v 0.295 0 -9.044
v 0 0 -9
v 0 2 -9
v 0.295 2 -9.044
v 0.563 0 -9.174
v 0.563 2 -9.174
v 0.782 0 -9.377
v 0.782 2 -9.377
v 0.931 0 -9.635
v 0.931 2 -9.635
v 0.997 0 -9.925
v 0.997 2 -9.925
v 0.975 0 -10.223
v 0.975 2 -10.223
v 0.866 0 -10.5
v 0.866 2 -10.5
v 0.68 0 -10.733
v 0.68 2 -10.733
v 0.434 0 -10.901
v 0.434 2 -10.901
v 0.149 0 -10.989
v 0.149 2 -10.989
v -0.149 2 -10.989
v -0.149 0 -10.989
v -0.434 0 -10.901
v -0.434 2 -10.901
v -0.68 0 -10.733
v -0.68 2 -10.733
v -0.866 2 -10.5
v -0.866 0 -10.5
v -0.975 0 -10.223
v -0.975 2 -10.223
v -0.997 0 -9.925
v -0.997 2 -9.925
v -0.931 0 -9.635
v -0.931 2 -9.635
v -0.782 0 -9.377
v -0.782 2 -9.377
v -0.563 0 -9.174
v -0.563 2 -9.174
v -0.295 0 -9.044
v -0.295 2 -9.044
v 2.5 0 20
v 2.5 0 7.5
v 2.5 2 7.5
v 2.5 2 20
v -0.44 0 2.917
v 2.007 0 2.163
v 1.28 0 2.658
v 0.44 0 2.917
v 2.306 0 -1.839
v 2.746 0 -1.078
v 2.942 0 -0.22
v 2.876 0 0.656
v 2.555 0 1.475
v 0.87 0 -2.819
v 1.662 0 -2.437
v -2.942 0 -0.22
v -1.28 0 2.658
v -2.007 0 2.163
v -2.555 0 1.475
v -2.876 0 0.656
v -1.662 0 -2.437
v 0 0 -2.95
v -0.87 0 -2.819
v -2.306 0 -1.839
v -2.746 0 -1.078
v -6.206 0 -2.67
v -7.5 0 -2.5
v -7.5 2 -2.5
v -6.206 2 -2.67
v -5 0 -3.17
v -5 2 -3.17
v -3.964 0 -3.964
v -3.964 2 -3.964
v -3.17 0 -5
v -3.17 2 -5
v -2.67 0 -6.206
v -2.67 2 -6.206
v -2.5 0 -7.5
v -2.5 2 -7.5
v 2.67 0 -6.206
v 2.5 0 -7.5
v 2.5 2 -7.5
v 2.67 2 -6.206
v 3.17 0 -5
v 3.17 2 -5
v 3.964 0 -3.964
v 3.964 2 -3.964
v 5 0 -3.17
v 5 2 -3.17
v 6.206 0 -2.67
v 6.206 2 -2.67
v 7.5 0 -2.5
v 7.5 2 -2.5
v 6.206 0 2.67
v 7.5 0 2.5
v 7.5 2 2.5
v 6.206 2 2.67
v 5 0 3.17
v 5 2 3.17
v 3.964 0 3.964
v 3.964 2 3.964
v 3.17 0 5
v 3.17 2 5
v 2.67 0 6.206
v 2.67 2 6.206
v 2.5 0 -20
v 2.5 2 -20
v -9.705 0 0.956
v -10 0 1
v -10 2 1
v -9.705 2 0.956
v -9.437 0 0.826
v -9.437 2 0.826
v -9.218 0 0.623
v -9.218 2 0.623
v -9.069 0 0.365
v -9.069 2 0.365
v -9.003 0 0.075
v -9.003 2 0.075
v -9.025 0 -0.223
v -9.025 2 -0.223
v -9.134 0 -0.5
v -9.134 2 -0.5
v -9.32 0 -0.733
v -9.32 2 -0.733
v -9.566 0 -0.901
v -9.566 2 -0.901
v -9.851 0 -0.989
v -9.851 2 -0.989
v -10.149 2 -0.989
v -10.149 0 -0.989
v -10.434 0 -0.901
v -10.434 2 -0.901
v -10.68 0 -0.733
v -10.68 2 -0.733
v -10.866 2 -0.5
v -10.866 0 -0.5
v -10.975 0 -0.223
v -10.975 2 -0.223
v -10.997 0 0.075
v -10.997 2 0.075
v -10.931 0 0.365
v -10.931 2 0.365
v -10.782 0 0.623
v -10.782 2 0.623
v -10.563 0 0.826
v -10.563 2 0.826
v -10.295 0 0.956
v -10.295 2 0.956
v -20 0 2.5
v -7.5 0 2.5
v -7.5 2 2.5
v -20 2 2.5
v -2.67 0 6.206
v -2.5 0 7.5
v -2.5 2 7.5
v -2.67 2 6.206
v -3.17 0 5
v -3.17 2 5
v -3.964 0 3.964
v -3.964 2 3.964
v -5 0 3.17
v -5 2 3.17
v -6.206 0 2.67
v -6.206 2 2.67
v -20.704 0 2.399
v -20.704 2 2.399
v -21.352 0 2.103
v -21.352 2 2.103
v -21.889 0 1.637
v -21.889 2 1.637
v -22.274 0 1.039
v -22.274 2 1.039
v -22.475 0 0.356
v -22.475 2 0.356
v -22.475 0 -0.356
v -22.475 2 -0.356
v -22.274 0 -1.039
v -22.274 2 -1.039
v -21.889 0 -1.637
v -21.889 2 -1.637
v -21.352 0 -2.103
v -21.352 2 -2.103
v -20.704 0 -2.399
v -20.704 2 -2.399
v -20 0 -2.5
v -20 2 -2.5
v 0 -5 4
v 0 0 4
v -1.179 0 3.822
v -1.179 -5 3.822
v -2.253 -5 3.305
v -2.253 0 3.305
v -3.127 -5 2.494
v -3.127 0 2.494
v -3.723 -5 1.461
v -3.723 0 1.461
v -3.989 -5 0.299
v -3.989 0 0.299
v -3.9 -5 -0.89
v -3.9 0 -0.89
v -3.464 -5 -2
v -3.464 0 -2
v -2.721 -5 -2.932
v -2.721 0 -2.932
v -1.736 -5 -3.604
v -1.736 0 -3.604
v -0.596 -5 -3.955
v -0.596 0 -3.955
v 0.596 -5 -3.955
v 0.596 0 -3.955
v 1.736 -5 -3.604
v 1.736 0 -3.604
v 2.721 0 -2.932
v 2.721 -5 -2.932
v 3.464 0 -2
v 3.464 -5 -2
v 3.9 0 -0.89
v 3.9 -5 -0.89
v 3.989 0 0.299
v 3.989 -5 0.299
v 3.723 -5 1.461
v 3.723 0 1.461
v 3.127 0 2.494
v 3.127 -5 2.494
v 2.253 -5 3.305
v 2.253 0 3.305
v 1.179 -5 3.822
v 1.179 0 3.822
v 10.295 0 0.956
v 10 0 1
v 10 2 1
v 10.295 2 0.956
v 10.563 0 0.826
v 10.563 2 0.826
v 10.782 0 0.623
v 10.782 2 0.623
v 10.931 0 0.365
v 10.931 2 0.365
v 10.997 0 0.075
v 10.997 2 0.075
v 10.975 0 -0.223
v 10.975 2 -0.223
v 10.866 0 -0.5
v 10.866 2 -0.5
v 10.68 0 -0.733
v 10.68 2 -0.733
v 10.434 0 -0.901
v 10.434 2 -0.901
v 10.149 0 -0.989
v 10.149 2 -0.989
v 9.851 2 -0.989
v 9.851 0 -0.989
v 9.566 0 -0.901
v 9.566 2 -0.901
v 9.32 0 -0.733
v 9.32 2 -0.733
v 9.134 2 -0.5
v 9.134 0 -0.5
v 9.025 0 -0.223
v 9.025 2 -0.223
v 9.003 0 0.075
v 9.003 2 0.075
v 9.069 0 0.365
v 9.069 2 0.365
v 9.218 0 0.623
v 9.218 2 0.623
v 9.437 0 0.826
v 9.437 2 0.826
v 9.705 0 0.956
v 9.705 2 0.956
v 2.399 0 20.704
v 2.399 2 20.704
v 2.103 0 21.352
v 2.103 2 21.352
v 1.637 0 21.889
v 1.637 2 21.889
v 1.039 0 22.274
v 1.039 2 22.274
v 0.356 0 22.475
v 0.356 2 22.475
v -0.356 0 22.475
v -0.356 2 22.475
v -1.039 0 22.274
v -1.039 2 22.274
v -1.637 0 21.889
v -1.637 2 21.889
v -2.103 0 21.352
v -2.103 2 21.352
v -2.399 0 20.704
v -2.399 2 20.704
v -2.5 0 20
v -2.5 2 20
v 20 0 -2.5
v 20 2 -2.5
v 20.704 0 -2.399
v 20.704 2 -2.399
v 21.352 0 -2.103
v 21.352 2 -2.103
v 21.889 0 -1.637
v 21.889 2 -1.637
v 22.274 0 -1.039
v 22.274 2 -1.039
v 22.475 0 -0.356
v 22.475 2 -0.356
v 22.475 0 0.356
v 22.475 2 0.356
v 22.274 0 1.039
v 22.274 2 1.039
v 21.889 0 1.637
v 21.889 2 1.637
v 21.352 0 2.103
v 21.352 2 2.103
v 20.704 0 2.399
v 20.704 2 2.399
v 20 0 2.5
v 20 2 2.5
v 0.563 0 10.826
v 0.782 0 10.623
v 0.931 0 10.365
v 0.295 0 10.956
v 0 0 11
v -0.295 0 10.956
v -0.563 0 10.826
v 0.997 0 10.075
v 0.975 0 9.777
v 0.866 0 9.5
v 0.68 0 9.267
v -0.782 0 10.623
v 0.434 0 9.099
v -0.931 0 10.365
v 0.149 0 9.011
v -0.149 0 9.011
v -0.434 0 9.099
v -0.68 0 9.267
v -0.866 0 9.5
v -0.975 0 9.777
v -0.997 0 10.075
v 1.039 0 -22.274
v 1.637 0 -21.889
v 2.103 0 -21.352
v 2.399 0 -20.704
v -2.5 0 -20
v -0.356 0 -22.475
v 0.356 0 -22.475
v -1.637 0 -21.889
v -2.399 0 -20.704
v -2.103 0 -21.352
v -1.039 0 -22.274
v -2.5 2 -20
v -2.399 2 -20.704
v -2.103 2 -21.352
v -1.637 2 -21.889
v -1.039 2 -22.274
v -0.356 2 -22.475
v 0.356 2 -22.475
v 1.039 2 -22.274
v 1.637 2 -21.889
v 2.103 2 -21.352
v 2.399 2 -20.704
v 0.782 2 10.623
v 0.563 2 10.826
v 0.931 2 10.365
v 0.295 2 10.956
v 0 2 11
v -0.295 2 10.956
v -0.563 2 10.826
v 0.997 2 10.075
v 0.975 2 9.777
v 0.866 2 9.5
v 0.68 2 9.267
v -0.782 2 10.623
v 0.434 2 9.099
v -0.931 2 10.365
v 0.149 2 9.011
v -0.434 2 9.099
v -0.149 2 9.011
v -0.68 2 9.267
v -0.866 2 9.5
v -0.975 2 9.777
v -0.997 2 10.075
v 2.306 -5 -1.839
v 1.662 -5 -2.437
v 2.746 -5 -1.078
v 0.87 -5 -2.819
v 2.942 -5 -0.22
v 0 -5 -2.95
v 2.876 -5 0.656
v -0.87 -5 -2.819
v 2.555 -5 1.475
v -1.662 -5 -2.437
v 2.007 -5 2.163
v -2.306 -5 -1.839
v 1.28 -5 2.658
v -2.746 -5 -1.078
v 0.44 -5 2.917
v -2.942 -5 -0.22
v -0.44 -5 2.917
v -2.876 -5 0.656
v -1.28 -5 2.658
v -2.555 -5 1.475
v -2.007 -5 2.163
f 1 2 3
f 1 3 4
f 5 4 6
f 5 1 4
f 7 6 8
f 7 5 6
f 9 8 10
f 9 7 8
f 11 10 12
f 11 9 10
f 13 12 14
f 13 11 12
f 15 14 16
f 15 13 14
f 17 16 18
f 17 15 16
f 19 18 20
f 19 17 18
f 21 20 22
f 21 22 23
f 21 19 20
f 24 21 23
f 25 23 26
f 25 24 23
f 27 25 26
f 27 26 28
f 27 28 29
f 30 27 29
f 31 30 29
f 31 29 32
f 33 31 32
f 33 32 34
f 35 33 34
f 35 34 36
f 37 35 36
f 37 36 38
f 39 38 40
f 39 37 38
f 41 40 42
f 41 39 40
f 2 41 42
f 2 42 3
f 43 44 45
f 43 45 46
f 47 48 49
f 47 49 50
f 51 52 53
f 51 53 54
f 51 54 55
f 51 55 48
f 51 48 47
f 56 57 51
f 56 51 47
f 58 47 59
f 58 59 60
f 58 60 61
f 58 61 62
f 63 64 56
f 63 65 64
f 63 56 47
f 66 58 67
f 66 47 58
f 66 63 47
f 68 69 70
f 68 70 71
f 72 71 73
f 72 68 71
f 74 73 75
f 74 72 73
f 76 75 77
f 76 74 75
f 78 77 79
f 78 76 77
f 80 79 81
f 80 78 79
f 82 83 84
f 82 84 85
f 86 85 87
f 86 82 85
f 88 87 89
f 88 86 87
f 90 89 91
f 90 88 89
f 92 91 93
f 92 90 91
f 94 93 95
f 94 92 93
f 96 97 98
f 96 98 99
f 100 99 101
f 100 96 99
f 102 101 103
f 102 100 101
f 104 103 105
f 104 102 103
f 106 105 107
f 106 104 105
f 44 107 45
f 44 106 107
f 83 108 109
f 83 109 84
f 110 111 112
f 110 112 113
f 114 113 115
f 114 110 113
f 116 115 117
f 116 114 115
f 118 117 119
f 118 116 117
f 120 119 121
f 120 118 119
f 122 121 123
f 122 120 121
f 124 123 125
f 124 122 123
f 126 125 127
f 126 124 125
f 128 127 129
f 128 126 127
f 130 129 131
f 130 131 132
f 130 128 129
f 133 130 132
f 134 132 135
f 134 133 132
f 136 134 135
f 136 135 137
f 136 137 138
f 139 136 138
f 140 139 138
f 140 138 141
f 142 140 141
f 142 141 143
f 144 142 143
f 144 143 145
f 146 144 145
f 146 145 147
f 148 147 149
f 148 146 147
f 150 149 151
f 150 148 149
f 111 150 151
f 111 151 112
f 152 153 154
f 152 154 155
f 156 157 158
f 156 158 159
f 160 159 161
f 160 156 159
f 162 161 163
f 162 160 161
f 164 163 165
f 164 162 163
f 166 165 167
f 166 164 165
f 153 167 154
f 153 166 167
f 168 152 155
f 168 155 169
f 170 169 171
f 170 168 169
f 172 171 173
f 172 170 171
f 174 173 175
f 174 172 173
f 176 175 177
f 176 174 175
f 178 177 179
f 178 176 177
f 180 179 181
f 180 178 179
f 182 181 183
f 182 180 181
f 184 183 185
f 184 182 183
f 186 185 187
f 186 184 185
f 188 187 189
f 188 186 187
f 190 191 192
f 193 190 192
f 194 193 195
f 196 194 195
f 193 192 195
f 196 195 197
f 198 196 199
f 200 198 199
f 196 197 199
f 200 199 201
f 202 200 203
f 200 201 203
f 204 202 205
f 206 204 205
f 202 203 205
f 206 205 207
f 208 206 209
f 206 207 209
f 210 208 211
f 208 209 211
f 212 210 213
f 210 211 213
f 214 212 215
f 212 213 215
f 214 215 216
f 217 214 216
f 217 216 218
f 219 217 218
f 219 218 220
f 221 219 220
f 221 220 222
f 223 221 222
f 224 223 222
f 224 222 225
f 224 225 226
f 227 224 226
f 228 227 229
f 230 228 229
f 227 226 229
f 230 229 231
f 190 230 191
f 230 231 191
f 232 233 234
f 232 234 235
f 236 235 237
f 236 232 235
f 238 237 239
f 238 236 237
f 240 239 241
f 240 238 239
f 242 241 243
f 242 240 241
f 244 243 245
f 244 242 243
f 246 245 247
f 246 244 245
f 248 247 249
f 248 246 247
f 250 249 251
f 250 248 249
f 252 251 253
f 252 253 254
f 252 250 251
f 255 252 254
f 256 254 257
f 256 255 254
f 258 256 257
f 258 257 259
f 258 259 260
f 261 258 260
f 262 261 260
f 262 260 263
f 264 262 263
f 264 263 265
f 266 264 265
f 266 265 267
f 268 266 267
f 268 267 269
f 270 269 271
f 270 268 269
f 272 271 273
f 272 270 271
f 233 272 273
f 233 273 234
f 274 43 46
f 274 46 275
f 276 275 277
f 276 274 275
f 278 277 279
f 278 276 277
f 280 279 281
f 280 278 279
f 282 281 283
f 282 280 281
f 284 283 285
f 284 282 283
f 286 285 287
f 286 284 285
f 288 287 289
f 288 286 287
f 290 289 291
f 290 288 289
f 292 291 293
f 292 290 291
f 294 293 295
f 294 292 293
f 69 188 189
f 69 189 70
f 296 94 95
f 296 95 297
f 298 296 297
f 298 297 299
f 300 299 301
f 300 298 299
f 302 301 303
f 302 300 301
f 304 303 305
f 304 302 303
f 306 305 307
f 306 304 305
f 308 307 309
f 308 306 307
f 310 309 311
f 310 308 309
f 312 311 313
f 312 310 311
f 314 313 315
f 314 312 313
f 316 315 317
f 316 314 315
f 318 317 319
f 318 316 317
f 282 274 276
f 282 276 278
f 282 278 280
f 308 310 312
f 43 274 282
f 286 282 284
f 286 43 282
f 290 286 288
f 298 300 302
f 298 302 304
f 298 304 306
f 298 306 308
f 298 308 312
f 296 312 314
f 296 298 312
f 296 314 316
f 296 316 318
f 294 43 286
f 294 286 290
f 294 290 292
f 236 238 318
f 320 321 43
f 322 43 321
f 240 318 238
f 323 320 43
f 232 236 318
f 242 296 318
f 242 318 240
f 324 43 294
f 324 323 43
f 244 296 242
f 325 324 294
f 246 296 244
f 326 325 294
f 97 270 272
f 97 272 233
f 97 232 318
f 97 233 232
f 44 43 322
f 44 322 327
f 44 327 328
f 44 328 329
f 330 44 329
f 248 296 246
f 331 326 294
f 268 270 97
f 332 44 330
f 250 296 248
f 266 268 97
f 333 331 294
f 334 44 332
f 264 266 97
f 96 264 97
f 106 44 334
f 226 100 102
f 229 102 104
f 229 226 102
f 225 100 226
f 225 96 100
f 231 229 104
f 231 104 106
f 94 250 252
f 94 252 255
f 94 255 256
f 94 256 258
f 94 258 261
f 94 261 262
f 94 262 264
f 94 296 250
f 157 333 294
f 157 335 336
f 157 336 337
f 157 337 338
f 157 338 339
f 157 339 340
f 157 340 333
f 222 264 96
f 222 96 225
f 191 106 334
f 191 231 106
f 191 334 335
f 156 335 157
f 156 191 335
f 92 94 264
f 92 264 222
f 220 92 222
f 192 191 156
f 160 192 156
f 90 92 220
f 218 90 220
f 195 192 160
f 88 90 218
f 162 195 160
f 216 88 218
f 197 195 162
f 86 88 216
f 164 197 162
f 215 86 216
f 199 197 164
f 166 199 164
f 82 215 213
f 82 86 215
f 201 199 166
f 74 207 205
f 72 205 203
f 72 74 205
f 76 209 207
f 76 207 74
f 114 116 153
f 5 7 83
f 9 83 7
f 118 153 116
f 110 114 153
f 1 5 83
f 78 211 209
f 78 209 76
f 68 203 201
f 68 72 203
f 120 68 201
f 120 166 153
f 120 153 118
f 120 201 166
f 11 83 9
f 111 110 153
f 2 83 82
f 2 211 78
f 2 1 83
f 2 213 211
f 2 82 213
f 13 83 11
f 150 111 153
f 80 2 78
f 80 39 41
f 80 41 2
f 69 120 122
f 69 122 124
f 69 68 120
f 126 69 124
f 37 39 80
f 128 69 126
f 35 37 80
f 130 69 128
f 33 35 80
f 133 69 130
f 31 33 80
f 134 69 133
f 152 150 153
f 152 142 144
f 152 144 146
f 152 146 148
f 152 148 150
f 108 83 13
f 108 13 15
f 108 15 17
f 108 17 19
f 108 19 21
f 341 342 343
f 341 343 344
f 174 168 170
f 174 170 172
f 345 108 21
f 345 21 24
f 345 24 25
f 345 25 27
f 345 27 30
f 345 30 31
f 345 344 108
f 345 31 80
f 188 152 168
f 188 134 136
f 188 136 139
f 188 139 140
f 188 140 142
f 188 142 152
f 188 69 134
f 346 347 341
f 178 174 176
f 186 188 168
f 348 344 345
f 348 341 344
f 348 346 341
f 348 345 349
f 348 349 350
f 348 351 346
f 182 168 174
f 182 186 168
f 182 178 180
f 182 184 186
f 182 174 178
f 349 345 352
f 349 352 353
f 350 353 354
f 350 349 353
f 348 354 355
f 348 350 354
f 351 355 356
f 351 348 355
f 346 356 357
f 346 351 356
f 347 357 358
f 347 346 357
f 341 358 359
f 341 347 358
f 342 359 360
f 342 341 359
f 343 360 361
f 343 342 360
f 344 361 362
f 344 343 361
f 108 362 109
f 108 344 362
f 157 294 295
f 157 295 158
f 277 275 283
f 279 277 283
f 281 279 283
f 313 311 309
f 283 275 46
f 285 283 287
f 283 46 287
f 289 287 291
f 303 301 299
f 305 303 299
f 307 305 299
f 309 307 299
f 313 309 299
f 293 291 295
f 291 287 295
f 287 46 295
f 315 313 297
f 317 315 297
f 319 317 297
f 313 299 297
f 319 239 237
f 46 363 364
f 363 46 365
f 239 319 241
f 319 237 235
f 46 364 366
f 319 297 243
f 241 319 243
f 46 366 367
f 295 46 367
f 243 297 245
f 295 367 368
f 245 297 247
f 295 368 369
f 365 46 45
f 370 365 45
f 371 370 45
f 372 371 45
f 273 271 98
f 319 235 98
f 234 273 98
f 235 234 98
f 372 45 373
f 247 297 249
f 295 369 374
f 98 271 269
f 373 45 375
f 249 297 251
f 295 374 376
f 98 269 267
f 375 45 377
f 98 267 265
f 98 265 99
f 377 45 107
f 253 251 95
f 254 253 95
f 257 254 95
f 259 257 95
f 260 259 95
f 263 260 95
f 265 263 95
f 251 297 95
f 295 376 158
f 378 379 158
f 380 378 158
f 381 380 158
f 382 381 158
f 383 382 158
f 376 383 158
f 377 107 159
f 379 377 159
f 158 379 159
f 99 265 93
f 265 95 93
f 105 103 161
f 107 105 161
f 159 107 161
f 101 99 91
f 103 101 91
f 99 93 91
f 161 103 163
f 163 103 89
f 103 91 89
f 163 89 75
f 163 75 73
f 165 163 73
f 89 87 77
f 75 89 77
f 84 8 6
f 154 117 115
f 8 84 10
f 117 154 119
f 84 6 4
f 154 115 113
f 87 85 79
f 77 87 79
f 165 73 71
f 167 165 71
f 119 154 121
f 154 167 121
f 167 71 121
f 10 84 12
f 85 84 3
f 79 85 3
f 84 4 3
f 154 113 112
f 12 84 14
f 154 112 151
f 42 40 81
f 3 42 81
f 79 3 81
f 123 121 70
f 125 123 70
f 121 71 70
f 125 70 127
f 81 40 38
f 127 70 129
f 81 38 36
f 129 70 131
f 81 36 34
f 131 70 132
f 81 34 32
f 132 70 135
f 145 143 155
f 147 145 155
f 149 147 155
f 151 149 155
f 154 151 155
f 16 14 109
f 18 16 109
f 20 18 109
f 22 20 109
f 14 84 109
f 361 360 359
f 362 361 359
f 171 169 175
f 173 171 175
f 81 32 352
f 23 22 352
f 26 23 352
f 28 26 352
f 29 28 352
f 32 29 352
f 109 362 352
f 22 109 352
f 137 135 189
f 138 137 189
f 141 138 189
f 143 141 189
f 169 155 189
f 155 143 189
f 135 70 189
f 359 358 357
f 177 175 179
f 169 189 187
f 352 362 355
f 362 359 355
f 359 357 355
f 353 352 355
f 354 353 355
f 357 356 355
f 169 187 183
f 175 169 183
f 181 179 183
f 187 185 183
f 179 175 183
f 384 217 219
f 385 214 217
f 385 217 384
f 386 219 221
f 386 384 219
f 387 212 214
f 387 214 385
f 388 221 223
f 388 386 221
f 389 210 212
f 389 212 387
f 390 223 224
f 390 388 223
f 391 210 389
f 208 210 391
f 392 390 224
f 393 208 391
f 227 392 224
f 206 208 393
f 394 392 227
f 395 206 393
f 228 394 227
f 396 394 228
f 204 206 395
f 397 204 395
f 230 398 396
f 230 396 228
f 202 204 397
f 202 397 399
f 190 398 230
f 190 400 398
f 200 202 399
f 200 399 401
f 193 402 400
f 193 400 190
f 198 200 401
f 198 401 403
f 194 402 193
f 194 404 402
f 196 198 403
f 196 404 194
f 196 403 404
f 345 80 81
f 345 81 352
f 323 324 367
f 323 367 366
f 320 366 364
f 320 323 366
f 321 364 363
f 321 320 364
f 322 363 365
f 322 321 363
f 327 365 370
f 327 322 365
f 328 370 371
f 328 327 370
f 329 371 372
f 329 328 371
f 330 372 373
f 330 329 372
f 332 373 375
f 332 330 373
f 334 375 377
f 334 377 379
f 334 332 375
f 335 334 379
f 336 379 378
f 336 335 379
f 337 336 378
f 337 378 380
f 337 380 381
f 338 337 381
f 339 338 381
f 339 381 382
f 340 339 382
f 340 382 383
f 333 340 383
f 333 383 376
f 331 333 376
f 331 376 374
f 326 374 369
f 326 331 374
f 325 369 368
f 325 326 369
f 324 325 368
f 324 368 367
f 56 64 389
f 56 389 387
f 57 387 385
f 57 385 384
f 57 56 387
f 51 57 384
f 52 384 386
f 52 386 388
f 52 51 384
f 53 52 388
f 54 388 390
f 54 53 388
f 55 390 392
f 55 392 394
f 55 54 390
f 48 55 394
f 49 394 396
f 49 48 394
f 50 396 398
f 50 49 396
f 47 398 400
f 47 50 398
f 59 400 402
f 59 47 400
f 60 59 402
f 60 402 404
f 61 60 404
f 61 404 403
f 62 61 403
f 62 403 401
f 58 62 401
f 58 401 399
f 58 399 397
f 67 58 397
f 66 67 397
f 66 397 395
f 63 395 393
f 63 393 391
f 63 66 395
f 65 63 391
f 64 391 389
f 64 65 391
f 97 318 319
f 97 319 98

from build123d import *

# Parameters (mm, degrees)
SKETCH1_R           = 1
BOSS_EXTRUDE1_DEPTH = 2
SKETCH2_R           = 4
SKETCH2_R_2         = 2.95
BOSS_EXTRUDE2_DEPTH = 5


with BuildPart() as part:
    # Sketch1 → Boss-Extrude1 (new body)
    with BuildSketch(Plane(origin=(0, 0, 0), x_dir=(1, 0, 0), z_dir=(0, 1, 0))):
        with BuildLine():
            Line((2.5, 20), (2.5, 7.5))
            ThreePointArc((2.5, 7.5), (3.964466094, 3.964466094), (7.5, 2.5))
            Line((7.5, 2.5), (20, 2.5))
            ThreePointArc((20, 2.5), (22.5, 0), (20, -2.5))
            Line((20, -2.5), (7.5, -2.5))
            ThreePointArc((7.5, -2.5), (3.964466094, -3.964466094), (2.5, -7.5))
            Line((2.5, -7.5), (2.5, -20))
            ThreePointArc((2.5, -20), (0, -22.5), (-2.5, -20))
            Line((-2.5, -20), (-2.5, -7.5))
            ThreePointArc((-2.5, -7.5), (-3.964466094, -3.964466094), (-7.5, -2.5))
            Line((-7.5, -2.5), (-20, -2.5))
            ThreePointArc((-20, -2.5), (-22.5, 0), (-20, 2.5))
            Line((-20, 2.5), (-7.5, 2.5))
            ThreePointArc((-7.5, 2.5), (-3.964466094, 3.964466094), (-2.5, 7.5))
            Line((-2.5, 7.5), (-2.5, 20))
            ThreePointArc((-2.5, 20), (0, 22.5), (2.5, 20))
        make_face()
        with Locations(Location((10, 0, 0), (0, 0, 270))):
            Circle(SKETCH1_R, mode=Mode.SUBTRACT)
        with Locations(Location((-10, 0, 0), (0, 0, 270))):
            Circle(SKETCH1_R, mode=Mode.SUBTRACT)
        with Locations(Location((0, 10, 0), (0, 0, 270))):
            Circle(SKETCH1_R, mode=Mode.SUBTRACT)
        with Locations(Location((0, -10, 0), (0, 0, 270))):
            Circle(SKETCH1_R, mode=Mode.SUBTRACT)
    extrude(amount=BOSS_EXTRUDE1_DEPTH)

    # Sketch2 → Boss-Extrude2 (add)
    with BuildSketch(Plane.XZ):
        with Locations(Location((0, 0, 0), (0, 0, 90))):
            Circle(SKETCH2_R)
        with Locations(Location((0, 0, 0), (0, 0, 270))):
            Circle(SKETCH2_R_2, mode=Mode.SUBTRACT)
    extrude(amount=BOSS_EXTRUDE2_DEPTH)


solid = part.part
